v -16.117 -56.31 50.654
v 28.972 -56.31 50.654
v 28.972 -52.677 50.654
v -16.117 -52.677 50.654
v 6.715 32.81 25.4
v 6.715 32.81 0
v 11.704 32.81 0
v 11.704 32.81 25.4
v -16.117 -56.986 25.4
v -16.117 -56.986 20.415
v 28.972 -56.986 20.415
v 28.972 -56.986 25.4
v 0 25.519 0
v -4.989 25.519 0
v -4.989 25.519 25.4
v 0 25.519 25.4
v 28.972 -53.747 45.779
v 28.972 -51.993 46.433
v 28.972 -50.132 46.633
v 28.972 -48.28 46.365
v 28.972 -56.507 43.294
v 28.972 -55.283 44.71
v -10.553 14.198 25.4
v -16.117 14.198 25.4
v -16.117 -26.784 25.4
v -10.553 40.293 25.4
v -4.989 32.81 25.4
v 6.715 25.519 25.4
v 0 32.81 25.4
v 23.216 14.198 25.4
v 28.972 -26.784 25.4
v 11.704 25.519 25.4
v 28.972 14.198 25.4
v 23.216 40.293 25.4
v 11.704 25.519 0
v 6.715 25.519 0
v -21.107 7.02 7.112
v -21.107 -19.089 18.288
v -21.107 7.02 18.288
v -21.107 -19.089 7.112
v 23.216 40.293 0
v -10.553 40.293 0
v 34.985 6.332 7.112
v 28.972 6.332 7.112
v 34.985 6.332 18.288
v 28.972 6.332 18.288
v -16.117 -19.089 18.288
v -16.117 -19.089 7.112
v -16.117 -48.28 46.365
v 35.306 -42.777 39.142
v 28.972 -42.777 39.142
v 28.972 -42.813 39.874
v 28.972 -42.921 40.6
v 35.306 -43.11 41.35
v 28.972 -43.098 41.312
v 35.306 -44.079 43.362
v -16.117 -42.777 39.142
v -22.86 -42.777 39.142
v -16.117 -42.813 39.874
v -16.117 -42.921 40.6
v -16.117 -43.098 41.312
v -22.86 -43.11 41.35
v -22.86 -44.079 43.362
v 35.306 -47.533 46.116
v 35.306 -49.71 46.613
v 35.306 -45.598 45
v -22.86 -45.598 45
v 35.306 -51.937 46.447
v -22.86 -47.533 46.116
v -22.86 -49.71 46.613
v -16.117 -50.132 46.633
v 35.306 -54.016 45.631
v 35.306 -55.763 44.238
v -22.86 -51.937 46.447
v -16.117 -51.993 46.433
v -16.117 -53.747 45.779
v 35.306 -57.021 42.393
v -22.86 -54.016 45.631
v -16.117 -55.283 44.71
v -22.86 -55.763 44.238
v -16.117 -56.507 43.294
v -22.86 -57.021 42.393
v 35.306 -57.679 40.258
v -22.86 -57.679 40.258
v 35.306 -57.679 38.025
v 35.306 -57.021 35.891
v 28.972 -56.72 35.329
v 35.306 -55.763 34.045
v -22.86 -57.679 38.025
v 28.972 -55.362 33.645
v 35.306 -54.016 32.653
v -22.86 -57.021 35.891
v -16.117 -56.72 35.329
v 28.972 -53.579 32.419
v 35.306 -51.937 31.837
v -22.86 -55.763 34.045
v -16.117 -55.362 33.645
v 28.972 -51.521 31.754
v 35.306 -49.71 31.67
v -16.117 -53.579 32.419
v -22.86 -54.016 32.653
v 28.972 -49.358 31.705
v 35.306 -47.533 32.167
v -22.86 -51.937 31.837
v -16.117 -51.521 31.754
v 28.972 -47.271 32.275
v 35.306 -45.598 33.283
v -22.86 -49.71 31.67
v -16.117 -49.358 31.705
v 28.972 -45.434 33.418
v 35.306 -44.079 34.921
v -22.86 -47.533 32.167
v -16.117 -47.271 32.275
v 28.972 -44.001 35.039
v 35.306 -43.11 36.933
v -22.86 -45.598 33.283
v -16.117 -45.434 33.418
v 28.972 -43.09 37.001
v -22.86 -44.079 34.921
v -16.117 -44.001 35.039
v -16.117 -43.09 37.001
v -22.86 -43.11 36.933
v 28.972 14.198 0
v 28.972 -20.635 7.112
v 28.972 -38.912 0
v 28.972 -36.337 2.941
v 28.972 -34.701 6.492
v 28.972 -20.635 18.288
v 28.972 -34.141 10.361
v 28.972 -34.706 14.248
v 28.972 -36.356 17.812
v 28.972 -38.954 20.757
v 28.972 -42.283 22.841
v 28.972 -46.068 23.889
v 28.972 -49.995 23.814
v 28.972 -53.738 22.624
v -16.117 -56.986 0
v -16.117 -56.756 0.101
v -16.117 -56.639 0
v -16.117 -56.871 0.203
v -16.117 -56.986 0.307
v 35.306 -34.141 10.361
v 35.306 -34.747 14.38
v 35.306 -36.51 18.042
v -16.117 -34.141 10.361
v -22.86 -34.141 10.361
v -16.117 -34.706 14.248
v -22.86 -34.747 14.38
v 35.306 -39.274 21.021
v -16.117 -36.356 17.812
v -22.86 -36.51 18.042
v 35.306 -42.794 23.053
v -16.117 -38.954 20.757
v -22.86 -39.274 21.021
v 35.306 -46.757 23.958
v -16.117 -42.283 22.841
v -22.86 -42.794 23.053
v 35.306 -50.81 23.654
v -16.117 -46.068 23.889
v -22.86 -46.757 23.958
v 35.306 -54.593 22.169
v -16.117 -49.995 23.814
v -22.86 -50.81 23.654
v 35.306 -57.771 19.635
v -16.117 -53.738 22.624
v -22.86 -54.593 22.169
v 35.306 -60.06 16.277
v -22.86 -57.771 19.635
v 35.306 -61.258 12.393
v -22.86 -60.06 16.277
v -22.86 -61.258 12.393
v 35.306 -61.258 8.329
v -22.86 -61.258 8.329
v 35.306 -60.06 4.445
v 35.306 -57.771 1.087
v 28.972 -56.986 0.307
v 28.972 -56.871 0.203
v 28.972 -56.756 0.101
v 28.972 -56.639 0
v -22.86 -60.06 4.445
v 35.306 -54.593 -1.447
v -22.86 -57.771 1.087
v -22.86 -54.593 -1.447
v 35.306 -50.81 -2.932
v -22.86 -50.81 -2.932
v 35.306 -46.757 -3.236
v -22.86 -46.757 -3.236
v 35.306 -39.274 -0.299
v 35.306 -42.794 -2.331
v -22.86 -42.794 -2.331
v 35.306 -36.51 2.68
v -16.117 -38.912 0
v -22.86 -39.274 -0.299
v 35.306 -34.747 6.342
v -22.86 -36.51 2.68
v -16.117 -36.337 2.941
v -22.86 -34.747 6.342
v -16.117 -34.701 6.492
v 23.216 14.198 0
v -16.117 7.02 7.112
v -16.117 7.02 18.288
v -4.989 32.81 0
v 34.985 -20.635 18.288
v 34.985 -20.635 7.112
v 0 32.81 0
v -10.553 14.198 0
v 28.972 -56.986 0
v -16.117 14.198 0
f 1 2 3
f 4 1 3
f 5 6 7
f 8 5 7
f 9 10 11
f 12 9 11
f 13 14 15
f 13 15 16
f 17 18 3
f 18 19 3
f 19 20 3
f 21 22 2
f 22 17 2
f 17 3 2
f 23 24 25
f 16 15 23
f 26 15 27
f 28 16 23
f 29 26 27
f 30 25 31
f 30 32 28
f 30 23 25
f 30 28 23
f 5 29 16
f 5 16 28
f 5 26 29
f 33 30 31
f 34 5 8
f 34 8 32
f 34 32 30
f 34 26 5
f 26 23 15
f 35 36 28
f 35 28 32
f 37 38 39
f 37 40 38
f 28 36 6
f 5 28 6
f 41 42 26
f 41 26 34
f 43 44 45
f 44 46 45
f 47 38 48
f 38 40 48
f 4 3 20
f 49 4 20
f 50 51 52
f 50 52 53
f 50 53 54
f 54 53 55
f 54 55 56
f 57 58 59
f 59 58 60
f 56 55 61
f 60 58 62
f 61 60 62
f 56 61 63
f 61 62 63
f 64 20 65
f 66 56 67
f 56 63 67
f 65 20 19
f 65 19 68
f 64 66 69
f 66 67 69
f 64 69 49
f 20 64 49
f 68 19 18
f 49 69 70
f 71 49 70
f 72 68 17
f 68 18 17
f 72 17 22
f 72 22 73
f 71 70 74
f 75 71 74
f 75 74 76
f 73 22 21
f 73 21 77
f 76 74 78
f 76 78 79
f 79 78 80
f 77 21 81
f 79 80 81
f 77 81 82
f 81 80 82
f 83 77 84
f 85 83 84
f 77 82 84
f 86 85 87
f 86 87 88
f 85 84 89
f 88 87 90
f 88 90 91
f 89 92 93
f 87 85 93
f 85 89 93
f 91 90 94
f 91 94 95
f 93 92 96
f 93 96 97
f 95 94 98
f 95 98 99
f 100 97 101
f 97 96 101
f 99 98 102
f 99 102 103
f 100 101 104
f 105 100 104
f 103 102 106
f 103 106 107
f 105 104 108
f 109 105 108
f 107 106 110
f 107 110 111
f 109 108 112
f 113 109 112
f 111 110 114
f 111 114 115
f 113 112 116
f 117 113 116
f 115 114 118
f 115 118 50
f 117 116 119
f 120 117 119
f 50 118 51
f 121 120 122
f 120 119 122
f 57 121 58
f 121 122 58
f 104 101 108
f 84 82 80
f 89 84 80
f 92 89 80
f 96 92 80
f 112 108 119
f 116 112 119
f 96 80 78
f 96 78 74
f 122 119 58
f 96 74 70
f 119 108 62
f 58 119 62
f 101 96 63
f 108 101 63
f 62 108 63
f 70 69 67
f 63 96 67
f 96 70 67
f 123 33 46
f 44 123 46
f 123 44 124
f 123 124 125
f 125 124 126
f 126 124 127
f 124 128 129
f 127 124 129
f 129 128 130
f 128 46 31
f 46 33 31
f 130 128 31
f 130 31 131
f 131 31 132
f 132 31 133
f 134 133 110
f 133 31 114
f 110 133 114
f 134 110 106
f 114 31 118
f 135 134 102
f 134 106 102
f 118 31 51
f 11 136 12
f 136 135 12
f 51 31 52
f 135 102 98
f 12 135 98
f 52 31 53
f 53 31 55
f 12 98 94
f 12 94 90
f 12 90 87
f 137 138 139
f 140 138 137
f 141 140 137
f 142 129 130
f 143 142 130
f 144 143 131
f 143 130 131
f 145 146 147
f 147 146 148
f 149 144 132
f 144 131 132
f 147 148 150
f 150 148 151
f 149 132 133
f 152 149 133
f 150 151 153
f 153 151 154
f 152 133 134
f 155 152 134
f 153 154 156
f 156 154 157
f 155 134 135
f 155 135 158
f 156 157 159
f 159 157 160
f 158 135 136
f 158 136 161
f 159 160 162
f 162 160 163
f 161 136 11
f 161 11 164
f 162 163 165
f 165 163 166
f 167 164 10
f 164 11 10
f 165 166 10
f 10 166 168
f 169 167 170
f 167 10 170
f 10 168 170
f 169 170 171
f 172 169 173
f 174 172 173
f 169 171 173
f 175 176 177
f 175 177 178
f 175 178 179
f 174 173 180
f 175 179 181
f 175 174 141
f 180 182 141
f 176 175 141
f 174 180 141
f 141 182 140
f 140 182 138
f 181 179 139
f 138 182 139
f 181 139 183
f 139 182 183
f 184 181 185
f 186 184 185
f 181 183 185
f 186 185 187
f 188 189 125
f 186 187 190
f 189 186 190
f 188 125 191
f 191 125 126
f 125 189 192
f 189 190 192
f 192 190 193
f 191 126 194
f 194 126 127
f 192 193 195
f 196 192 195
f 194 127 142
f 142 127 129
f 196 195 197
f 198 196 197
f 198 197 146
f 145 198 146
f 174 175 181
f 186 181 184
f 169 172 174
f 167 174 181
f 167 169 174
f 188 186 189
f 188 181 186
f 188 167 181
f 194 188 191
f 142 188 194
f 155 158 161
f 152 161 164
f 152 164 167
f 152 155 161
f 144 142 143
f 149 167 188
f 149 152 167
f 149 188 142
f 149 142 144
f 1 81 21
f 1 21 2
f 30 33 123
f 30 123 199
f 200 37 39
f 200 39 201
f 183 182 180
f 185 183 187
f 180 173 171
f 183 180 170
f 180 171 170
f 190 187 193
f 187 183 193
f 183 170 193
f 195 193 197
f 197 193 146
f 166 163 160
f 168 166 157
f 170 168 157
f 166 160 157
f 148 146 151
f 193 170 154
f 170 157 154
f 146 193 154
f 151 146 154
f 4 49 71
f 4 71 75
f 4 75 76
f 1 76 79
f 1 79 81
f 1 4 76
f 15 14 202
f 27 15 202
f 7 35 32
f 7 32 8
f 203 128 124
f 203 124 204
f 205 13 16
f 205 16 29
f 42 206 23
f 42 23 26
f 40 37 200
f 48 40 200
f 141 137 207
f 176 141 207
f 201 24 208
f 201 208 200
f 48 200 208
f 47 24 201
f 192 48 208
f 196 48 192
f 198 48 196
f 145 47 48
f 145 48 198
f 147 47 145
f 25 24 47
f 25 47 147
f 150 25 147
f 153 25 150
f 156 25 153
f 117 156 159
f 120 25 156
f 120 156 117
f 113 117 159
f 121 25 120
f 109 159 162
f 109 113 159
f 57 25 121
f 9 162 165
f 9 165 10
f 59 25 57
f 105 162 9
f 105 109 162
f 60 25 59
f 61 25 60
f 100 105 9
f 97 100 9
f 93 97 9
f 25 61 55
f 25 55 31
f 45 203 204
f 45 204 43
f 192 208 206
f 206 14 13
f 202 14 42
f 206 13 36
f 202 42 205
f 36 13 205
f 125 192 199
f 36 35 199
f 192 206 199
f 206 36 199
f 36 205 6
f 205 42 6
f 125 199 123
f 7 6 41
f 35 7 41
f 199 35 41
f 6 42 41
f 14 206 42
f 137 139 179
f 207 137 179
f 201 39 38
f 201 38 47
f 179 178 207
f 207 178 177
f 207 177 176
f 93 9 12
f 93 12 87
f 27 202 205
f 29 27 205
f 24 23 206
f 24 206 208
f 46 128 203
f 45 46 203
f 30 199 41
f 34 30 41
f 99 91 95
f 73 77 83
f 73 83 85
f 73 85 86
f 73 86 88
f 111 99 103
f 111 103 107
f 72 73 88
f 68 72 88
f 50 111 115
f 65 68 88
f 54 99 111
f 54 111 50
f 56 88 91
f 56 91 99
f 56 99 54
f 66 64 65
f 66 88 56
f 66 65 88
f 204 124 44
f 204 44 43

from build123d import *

# Parameters (mm, degrees)
F0_W          = 33.7692135945
F0_H          = 26.0943928733
F0_W_2        = 4.9886330962
F0_H_2        = 7.2910804302
F0_W_3        = 45.0895689428
F0_H_3        = 28.9724431932
F1_DEPTH      = 25.4
F3_DEPTH      = 45.0895689428
F4_R          = 7.4927788442
F4_R_2        = 13.6349594123
F5_DEPTH      = 35.306
F5_DEPTH_BACK = 22.86
F6_DEPTH      = 25.4
F8_DEPTH      = 22.861
F8_DEPTH_BACK = 35.307
F11_W         = 4.9897357821
F11_H         = 26.1090615085
F11_W_2       = 6.0124509037
F11_H_2       = 26.9668074491
F12_DEPTH     = 5.588


with BuildPart() as f1:
    # F0 (on Top) → F1 (new body)
    with BuildSketch(Plane.XY):
        with Locations((6.3317283057, 27.245614212)):
            Rectangle(F0_W, F0_H)
        with Locations((-2.4943165481, 29.164317064)):
            Rectangle(F0_W_2, F0_H_2, mode=Mode.SUBTRACT)
        with Locations((9.2097842135, 29.164317064)):
            Rectangle(F0_W_2, F0_H_2, mode=Mode.SUBTRACT)
        Polygon((23.2163351029, 14.1984177753), (-10.5528784916, 14.1984177753), (-16.1171220243, 14.1984177753), (-16.1171220243, -28.0130952597), (28.9724469185, -28.0130952597), (28.9724469185, 14.1984177753), align=None)
        with Locations((6.4276624471, -42.4993168563)):
            Rectangle(F0_W_3, F0_H_3)
    extrude(amount=F1_DEPTH)

    # F2 (on face) → F3 (join, through all)
    with BuildSketch(Plane(origin=(-16.1171220243, 0, 0), x_dir=(0, -1, 0), z_dir=(-1, 0, 0))):
        Polygon((56.2180615962, 54.1074834764), (26.784285903, 25.4), (56.9855384529, 25.4), align=None)
    extrude(amount=-F3_DEPTH)

    # F4 (on Right) → F5 (join, two sides)
    with BuildSketch(Plane.YZ) as f5_sk:
        with Locations((-50.2700731158, 39.1415841877)):
            Circle(F4_R)
        with Locations((-47.7757565677, 10.3610064834)):
            Circle(F4_R_2)
    extrude(amount=F5_DEPTH)
    extrude(f5_sk.sketch, amount=-F5_DEPTH_BACK)

    # F0 (on Top) → F6 (join)
    with BuildSketch(Plane.XY):
        with Locations((6.3317283057, 27.245614212)):
            Rectangle(F0_W, F0_H)
        with Locations((-2.4943165481, 29.164317064)):
            Rectangle(F0_W_2, F0_H_2, mode=Mode.SUBTRACT)
        with Locations((9.2097842135, 29.164317064)):
            Rectangle(F0_W_2, F0_H_2, mode=Mode.SUBTRACT)
        Polygon((23.2163351029, 14.1984177753), (-10.5528784916, 14.1984177753), (-16.1171220243, 14.1984177753), (-16.1171220243, -28.0130952597), (28.9724469185, -28.0130952597), (28.9724469185, 14.1984177753), align=None)
        with Locations((6.4276624471, -42.4993168563)):
            Rectangle(F0_W_3, F0_H_3)
    extrude(amount=F6_DEPTH)

    # F7 (on Right) → F8 (cut, two sides)
    with BuildSketch(Plane.YZ) as f8_sk:
        Polygon((-56.4099289477, 54.4912219048), (-56.4099289477, 50.6538152695), (-52.3806512356, 50.6538152695), align=None)
    extrude(amount=-F8_DEPTH, mode=Mode.SUBTRACT)
    extrude(f8_sk.sketch, amount=F8_DEPTH_BACK, mode=Mode.SUBTRACT)

    # F11 (on plane+point) → F12 (join, symmetric)
    with BuildSketch(Plane.XY.offset(12.7)):
        with Locations((-18.6119899154, -6.034891739)):
            Rectangle(F11_W, F11_H)
        with Locations((31.9786723703, -7.1516768159)):
            Rectangle(F11_W_2, F11_H_2)
    extrude(amount=F12_DEPTH, both=True)


solid = f1.part
